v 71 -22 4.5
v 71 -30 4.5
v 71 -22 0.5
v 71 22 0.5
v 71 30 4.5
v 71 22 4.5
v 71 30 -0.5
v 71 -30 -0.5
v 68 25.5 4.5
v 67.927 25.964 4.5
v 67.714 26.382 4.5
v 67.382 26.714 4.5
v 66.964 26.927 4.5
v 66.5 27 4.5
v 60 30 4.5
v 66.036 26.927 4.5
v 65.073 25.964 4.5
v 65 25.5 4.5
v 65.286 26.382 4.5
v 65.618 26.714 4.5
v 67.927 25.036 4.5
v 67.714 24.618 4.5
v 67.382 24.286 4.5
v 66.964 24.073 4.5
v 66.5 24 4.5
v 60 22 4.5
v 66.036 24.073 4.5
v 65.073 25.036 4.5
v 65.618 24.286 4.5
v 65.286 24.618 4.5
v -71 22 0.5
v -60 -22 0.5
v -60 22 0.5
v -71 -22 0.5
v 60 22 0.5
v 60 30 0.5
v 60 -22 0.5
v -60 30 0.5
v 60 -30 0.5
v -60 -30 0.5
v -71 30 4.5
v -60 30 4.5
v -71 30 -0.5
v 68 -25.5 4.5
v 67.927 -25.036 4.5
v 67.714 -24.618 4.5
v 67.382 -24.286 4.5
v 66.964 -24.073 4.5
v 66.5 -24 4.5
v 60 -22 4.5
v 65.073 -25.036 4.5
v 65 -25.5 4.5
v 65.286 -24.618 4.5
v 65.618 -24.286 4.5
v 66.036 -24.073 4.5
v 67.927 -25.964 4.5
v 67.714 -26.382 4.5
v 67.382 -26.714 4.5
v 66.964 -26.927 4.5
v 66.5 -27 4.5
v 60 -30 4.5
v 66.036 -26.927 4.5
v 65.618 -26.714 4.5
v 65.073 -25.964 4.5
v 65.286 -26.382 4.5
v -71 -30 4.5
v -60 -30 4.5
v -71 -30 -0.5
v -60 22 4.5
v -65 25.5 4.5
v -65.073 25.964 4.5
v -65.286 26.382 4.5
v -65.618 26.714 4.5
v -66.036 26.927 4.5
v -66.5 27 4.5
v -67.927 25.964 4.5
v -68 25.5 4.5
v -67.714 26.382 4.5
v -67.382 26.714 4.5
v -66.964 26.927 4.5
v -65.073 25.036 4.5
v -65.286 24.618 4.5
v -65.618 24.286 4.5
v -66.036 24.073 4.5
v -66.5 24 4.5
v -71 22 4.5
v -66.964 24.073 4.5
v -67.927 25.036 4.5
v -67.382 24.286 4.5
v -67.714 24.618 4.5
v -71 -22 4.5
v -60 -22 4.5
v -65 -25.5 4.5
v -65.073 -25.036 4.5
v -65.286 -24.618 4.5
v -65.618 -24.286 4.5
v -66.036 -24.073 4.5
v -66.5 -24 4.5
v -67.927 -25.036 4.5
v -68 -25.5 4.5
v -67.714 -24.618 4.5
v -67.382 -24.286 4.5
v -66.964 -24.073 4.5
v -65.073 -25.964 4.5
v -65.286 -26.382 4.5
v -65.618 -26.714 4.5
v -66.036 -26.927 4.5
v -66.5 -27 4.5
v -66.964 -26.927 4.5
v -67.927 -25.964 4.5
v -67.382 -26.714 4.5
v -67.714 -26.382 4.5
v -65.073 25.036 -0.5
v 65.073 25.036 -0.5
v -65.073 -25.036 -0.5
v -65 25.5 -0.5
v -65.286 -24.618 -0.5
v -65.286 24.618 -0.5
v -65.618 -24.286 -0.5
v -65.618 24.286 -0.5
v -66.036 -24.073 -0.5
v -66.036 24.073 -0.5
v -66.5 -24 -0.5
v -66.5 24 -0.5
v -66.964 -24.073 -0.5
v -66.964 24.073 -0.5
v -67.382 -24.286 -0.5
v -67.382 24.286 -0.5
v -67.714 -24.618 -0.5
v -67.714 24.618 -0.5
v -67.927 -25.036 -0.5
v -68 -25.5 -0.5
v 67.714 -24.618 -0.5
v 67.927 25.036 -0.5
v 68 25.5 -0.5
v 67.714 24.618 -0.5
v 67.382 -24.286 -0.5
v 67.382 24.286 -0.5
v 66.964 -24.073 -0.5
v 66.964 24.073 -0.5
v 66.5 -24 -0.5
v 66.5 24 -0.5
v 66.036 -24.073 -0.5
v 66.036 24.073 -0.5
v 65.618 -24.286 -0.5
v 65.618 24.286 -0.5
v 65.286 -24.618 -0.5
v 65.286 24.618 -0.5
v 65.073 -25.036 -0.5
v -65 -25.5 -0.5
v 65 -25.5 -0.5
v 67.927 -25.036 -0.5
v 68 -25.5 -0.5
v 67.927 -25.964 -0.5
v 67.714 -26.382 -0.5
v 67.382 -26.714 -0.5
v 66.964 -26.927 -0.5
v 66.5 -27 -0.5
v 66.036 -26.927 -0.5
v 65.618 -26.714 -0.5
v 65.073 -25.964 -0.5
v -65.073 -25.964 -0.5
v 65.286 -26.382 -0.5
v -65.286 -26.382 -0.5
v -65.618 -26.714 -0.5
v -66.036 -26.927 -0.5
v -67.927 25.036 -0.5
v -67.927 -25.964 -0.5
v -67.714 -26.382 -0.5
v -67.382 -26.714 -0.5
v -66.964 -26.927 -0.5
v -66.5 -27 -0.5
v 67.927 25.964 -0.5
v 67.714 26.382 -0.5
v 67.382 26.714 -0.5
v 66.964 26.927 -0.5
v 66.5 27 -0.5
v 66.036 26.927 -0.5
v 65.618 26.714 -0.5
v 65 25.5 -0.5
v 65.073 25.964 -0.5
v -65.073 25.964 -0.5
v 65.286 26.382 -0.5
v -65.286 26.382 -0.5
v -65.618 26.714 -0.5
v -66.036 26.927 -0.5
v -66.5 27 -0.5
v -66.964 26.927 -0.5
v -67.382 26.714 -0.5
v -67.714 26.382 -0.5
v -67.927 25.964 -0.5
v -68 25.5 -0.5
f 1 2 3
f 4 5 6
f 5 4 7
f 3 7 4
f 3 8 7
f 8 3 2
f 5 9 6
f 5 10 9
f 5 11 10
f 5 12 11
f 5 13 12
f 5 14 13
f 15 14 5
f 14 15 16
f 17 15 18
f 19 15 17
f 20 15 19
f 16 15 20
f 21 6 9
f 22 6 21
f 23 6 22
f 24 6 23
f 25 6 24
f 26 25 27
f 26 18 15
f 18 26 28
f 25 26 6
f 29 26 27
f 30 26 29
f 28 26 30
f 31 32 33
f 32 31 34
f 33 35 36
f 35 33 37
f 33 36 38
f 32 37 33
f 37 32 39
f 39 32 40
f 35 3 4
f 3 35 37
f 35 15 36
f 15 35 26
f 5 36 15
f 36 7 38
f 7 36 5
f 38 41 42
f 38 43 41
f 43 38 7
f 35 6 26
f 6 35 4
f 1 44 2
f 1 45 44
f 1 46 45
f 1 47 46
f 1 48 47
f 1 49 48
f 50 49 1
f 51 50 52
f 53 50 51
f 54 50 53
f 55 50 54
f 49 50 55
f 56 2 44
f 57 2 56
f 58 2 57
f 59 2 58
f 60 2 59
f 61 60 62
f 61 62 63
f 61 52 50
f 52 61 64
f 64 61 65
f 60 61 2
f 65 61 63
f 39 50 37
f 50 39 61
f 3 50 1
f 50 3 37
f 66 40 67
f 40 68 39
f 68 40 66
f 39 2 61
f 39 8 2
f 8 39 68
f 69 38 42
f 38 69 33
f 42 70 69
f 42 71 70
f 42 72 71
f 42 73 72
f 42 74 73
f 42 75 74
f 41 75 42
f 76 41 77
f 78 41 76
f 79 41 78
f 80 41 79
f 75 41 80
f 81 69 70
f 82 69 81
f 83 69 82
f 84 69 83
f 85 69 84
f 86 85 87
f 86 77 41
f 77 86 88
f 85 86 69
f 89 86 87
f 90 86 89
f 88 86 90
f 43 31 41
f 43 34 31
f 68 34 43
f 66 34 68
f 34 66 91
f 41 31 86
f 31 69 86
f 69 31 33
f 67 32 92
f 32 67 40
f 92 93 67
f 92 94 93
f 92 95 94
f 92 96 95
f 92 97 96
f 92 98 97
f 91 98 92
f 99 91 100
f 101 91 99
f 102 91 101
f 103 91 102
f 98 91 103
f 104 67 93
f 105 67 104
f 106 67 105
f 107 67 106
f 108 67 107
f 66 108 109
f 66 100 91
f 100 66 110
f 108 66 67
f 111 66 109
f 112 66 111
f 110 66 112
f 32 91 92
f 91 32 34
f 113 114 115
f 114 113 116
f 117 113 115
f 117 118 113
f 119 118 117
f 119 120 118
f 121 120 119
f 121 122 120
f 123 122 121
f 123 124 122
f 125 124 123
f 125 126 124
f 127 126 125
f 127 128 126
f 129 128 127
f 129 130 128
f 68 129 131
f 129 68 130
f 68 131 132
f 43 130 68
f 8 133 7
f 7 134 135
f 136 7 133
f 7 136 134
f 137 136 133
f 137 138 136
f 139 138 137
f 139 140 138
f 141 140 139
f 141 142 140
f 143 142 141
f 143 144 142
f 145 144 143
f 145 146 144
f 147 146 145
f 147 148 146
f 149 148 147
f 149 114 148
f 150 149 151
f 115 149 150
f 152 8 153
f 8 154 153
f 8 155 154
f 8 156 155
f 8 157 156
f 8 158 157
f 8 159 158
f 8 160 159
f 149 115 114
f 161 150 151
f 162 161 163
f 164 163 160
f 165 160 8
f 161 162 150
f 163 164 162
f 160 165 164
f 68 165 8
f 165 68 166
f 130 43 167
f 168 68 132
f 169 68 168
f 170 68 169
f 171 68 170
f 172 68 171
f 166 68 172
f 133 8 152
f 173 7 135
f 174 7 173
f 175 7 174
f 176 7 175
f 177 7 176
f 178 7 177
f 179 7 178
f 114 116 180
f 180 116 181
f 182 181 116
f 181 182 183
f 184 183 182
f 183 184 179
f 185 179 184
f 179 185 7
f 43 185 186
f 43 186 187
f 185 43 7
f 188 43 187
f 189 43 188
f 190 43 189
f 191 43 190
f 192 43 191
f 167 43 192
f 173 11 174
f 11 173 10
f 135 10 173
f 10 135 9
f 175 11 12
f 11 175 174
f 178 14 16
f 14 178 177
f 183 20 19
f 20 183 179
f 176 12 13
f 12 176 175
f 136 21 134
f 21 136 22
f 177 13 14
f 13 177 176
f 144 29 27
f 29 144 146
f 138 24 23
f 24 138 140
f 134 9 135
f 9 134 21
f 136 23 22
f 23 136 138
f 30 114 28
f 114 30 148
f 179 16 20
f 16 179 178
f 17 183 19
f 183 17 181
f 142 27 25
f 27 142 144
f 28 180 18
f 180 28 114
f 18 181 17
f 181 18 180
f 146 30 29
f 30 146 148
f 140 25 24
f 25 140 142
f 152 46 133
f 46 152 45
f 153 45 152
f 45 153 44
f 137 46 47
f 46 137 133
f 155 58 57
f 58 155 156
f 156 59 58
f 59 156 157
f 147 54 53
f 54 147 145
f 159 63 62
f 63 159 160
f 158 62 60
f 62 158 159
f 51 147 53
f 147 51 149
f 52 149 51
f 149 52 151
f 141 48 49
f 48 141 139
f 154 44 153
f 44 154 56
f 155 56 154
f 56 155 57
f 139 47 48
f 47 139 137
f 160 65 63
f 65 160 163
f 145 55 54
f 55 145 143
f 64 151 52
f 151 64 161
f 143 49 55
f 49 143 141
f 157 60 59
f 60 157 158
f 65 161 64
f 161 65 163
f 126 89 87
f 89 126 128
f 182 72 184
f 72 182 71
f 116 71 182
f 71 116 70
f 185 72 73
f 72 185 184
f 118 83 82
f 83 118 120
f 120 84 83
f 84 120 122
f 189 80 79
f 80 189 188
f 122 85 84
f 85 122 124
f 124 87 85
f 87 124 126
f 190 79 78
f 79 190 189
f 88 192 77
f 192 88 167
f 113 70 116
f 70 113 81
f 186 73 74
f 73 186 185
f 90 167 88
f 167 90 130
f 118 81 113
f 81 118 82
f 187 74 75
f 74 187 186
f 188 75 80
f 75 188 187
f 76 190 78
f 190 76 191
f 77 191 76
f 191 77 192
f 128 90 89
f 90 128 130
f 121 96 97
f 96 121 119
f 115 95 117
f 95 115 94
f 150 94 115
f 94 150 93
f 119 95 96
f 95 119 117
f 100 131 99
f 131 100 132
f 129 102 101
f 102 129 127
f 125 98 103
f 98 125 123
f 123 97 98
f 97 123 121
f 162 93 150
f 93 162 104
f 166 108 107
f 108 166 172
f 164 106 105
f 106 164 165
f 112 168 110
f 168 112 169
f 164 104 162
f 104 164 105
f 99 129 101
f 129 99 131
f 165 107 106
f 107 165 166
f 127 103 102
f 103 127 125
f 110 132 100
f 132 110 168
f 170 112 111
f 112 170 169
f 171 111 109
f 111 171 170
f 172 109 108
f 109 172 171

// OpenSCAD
/*
 * Holder for a “8 Relay Module”
 *
 * All measurements in mm.
 */

$fn = 20;

/* main dimensions (width, depth, height): */
W = 142;
D = 60;
H = 1;

/* screw hole distances (center to center, along X and Y axis): */
HDX = 133;
HDY = 51;

/* screw hole diameter: */
HD = 3;

/* spacer dimensions: */
SW = 11;
SD = 8;
SH = 4;

difference() {
    union() {
        /* main body: */
        cube([W,D,H], center=true);
        /* spacers: */
        for (i = [1,-1], j = [1,-1]) {
            translate([i*(W-SW)/2,j*(D-SD)/2,SH/2+H/2]) cube([SW,SD,SH], center=true);
        }
    }
    /* screw holes: */
    for (i = [1,-1], j = [1,-1]) {
        translate([i*HDX/2,j*HDY/2,SH/2]) cylinder(d=HD, h=H+SH, center=true);
    }
}
